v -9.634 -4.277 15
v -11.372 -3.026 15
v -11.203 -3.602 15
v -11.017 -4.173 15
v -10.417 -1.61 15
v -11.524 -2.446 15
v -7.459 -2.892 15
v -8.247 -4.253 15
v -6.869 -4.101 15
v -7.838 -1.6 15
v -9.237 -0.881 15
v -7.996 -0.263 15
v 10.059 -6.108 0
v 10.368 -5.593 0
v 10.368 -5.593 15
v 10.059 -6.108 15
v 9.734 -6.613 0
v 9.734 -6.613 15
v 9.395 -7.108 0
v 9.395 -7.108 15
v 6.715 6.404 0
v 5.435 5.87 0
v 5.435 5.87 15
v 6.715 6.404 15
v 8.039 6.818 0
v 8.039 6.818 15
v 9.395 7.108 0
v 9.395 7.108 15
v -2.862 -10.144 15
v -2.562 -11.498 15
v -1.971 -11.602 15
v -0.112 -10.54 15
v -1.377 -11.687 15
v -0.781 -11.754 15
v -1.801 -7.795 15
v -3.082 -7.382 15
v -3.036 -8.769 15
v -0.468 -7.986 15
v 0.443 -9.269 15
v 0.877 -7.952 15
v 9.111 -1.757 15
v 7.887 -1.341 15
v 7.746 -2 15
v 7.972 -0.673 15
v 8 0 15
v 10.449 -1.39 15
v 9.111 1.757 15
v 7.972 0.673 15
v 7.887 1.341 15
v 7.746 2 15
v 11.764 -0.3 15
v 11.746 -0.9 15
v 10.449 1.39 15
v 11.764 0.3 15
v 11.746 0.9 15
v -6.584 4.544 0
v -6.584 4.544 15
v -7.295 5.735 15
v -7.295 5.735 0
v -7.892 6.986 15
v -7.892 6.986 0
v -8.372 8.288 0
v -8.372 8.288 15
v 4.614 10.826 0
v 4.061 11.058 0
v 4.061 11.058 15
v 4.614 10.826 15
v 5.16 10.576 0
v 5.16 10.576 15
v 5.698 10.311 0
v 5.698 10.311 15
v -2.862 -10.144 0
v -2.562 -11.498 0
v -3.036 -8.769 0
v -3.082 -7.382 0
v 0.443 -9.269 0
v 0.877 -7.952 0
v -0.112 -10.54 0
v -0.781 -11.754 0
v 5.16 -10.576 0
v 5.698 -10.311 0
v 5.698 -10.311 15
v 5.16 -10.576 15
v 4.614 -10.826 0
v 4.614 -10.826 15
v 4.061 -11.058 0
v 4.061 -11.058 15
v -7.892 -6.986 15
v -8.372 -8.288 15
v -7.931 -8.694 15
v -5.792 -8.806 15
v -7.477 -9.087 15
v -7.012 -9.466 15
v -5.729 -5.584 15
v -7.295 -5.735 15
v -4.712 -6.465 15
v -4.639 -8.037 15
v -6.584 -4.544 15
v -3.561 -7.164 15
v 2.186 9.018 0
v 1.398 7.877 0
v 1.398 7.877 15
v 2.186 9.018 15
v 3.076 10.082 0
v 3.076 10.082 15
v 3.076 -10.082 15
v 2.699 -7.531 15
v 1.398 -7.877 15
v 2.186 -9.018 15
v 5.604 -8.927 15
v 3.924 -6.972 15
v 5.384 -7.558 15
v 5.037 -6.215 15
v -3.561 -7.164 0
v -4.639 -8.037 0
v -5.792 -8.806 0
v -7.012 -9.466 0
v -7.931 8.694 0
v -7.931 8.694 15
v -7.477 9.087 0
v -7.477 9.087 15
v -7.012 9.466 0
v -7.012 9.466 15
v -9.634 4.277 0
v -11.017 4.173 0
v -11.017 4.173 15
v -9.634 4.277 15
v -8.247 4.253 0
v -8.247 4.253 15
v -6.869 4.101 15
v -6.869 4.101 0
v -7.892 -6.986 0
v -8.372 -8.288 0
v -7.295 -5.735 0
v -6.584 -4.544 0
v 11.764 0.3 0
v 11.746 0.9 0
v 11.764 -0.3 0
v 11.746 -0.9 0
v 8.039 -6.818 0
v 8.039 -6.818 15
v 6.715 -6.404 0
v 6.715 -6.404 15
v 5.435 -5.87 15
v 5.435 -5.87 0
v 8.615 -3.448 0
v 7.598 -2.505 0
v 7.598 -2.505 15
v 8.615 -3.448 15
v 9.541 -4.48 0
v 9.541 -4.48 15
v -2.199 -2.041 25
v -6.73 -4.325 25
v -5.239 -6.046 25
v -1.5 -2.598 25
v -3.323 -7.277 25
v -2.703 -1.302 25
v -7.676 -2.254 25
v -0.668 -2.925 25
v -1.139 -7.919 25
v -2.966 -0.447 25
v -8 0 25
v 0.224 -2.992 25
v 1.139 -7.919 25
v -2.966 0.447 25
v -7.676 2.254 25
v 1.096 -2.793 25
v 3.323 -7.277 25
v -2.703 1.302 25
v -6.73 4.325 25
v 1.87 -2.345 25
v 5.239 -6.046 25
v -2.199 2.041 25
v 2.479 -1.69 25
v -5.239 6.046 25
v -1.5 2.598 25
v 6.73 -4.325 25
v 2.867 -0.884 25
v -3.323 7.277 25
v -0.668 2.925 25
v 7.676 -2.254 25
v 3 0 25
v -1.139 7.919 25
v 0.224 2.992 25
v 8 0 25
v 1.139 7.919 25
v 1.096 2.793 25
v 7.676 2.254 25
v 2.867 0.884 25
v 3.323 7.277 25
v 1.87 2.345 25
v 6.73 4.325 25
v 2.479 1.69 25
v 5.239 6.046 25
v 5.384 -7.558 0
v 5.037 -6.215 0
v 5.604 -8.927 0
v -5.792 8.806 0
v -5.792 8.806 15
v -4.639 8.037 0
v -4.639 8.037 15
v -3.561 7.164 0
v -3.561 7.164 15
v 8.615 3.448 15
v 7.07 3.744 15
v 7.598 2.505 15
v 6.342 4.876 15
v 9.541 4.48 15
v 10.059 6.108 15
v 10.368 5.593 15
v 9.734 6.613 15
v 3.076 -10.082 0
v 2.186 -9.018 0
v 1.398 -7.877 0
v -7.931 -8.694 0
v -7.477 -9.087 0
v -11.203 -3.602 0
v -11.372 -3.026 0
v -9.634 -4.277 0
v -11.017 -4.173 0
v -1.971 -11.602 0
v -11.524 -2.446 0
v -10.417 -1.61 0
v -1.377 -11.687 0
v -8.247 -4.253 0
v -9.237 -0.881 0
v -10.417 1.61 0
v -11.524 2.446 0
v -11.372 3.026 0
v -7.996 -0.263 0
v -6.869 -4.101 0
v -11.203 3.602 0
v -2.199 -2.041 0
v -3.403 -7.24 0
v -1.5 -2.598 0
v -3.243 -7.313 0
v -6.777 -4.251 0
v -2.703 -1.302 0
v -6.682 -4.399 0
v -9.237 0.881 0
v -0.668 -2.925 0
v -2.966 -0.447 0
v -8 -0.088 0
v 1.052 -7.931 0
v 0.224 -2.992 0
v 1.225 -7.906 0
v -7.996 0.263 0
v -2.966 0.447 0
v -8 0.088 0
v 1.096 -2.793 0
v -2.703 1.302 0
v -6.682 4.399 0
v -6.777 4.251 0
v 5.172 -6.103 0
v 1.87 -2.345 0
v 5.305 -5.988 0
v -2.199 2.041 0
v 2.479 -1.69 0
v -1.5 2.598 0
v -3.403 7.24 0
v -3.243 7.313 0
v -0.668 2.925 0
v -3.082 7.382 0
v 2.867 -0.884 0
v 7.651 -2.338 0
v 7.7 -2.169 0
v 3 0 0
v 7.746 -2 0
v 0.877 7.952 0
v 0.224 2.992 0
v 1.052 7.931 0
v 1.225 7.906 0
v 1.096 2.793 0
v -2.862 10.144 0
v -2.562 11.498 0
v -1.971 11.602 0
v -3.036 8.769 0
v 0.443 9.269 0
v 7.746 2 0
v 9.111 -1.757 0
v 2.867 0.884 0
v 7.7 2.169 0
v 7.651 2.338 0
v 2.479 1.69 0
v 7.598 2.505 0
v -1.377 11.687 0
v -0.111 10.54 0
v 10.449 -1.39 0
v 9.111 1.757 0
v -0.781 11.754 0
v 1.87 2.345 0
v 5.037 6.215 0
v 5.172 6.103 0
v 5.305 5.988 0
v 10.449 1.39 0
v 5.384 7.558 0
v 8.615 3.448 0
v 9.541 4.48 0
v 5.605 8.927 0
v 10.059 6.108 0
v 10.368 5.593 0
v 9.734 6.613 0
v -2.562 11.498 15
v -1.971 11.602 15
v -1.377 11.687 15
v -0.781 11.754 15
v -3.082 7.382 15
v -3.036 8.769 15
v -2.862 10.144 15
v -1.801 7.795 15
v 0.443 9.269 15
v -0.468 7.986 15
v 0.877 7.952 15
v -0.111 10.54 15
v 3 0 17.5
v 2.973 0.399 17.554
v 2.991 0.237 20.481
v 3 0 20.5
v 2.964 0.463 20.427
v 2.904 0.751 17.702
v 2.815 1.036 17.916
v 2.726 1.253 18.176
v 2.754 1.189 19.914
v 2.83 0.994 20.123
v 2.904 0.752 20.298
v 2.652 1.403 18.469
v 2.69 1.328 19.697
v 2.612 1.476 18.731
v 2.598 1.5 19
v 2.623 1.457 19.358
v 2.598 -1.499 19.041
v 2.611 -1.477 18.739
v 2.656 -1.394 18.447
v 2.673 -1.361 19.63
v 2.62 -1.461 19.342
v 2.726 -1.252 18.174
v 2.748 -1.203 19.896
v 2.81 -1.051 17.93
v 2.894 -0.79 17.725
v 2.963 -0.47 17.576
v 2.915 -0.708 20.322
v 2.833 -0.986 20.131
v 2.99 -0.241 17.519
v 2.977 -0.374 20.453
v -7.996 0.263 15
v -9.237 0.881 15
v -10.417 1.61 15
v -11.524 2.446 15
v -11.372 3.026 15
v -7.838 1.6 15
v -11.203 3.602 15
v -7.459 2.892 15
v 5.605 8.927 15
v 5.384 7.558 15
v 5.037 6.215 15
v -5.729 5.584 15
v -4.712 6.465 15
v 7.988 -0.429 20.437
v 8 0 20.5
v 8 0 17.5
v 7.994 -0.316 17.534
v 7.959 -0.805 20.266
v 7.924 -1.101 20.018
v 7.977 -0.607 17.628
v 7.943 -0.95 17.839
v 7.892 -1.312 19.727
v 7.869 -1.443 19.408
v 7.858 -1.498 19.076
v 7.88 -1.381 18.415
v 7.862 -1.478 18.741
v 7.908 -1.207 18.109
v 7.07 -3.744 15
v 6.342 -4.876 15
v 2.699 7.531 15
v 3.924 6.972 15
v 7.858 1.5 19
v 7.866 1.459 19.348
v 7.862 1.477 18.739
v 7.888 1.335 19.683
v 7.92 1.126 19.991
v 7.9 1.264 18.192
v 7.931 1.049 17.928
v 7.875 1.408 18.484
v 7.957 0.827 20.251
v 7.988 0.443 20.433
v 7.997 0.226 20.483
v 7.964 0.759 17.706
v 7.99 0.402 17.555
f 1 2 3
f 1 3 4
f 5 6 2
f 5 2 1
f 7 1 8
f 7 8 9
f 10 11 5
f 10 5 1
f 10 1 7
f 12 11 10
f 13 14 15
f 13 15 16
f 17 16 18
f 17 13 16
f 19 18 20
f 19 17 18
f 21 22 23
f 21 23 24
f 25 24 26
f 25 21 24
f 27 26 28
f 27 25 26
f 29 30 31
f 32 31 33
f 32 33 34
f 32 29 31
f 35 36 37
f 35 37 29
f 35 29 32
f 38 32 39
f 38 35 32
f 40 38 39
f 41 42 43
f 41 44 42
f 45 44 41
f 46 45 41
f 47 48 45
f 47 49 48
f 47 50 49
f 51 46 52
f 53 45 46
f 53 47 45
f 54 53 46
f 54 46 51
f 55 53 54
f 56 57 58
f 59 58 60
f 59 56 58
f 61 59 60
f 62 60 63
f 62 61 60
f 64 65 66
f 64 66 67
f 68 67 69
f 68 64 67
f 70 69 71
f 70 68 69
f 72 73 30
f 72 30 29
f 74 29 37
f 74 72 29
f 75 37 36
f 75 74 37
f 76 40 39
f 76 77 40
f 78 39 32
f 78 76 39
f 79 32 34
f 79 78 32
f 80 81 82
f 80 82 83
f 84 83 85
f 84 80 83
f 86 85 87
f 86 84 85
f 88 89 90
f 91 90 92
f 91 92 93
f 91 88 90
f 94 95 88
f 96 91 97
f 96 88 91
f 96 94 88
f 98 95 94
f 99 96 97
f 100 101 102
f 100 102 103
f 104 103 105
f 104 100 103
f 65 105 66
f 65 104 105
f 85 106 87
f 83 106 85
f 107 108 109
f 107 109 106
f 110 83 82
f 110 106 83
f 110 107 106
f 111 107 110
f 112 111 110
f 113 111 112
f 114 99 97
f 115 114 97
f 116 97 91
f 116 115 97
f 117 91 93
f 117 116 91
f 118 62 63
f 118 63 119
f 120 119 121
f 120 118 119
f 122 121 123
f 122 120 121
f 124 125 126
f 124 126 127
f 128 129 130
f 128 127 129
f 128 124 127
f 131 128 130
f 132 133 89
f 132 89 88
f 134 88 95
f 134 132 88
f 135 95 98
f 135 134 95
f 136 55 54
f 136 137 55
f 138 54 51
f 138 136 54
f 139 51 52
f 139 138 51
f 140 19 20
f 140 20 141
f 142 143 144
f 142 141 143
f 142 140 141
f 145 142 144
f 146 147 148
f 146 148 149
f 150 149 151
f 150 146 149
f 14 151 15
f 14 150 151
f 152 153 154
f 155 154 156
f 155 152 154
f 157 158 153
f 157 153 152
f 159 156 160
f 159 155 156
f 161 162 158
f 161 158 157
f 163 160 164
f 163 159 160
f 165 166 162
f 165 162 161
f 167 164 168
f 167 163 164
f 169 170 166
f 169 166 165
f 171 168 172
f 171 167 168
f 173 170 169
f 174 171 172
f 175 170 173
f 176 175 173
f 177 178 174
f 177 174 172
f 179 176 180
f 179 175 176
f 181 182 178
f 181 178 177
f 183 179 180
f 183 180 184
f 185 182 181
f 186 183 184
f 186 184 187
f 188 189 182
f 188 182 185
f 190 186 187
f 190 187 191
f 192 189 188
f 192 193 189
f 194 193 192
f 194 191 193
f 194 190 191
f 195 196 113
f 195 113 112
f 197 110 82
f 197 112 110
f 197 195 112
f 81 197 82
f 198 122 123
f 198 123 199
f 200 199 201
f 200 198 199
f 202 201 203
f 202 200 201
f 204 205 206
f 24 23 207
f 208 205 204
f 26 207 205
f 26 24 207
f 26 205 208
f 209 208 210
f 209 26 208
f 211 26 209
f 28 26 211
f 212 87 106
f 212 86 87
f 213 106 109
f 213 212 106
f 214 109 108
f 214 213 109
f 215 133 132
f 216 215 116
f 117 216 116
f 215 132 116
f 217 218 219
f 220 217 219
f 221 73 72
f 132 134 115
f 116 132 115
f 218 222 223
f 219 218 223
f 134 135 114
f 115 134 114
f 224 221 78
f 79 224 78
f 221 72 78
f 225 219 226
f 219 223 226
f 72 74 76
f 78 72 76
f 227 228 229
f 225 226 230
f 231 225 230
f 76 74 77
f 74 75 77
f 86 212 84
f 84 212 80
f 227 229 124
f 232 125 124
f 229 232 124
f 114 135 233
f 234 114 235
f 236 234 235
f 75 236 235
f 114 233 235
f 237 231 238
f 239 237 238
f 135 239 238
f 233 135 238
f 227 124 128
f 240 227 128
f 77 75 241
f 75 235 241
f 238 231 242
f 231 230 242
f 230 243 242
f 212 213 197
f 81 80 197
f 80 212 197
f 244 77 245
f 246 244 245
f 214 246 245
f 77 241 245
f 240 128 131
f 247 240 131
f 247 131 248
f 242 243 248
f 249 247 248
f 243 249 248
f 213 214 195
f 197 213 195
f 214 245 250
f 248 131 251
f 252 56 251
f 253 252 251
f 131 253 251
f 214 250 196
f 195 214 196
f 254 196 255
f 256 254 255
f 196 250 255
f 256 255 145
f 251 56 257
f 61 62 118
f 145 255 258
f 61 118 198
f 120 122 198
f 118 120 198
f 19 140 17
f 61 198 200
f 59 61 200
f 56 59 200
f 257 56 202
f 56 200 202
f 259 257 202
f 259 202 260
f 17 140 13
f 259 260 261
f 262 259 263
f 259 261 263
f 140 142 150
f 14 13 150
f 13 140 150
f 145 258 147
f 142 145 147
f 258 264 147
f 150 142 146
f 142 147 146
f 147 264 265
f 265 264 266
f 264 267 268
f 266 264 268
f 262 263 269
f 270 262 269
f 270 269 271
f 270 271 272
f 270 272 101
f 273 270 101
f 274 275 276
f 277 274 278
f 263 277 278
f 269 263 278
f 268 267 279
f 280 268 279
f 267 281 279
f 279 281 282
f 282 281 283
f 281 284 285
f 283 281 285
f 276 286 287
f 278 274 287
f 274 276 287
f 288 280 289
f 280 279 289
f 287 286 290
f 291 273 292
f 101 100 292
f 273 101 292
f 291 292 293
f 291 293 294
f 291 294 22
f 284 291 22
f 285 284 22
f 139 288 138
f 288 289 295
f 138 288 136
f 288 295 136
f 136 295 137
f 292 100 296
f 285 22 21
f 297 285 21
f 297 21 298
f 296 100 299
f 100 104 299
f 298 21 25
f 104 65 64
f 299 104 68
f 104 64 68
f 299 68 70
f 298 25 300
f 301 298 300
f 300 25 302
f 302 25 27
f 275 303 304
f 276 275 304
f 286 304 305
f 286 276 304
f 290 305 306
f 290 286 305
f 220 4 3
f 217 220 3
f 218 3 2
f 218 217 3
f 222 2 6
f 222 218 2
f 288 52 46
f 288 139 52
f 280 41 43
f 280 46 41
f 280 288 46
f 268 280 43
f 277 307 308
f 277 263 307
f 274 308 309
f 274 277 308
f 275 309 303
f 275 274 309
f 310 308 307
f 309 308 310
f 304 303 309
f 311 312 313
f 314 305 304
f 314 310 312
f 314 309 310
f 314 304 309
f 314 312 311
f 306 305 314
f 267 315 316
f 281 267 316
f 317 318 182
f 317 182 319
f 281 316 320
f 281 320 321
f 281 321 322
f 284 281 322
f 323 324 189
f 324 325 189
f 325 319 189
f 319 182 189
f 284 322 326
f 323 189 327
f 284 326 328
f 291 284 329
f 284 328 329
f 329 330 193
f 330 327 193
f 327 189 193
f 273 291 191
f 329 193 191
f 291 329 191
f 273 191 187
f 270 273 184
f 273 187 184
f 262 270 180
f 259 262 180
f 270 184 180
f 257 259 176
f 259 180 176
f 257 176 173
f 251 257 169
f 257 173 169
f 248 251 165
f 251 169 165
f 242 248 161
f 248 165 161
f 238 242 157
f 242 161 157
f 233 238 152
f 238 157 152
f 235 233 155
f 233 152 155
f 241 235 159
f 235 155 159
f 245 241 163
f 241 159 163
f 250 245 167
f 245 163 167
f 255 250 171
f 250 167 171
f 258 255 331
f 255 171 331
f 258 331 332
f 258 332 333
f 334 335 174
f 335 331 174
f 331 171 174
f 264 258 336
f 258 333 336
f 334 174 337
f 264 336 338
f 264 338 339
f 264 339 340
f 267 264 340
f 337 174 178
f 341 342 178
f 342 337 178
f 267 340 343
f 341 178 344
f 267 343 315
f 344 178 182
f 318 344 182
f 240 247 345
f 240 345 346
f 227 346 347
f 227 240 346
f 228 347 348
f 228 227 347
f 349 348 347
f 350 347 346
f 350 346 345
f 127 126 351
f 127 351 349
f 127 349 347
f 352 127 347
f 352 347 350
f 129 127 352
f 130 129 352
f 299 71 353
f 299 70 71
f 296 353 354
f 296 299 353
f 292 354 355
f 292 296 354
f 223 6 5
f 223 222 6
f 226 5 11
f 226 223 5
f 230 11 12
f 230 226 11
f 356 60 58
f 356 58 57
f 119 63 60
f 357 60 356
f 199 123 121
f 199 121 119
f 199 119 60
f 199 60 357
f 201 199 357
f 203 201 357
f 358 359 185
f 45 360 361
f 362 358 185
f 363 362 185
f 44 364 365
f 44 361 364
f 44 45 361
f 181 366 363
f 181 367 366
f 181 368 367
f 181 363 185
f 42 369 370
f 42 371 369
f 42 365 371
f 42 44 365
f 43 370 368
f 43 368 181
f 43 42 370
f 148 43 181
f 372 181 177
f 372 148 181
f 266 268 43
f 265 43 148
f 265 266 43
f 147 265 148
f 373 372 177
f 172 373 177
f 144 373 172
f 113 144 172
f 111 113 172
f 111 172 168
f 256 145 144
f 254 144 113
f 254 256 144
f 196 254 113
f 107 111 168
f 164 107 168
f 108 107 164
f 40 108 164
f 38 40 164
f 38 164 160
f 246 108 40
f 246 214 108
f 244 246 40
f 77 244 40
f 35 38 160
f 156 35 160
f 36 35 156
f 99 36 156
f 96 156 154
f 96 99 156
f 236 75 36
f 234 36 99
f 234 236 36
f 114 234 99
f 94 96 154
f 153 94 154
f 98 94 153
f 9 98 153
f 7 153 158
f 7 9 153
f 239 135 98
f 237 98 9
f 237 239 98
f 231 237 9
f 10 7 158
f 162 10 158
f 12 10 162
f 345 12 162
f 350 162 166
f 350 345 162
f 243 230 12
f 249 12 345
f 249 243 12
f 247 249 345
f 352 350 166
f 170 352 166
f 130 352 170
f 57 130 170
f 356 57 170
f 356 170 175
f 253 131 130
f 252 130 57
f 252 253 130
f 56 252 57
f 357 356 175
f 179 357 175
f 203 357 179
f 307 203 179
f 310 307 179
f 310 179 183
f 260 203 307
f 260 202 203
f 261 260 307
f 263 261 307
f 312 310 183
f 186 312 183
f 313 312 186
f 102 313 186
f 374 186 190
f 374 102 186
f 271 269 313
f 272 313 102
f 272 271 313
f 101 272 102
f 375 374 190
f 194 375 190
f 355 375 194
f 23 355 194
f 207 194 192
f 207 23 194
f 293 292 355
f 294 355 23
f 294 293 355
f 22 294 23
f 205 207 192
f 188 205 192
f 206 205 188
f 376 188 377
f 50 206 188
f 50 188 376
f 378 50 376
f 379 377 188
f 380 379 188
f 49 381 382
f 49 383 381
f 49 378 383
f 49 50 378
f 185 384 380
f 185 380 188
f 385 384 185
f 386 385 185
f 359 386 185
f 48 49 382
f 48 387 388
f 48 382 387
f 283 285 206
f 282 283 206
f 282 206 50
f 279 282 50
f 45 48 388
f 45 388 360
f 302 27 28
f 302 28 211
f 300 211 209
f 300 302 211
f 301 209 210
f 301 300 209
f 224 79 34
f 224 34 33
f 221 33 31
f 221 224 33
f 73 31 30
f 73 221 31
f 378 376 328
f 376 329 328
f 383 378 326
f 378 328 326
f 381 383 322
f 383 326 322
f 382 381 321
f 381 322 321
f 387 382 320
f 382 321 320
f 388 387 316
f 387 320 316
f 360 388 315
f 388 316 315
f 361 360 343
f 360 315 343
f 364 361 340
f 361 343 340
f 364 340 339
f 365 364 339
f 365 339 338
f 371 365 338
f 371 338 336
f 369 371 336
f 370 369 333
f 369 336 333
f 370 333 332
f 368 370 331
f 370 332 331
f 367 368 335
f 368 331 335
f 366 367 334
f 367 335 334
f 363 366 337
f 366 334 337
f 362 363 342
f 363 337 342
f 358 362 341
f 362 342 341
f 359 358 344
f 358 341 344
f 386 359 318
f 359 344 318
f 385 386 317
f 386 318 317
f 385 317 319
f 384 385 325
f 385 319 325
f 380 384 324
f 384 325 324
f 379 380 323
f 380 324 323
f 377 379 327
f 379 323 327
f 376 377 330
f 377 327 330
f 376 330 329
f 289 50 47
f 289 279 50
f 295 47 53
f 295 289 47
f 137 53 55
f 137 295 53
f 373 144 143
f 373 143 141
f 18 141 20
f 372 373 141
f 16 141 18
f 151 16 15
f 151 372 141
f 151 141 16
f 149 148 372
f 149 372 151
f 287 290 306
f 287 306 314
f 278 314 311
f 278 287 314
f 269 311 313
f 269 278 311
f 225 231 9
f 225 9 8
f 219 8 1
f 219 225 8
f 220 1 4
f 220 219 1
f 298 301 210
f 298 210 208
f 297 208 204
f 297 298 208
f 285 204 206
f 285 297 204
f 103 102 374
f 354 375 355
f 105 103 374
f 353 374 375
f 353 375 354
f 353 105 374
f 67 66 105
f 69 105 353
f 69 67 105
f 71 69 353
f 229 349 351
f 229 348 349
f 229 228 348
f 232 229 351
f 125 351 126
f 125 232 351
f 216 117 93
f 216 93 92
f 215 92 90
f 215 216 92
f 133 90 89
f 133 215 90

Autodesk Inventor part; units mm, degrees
ref_plane "YZ Plane" through (0, 0, 0) normal (1, 0, 0) x (0, 1, 0)
ref_plane "XZ Plane" through (0, 0, 0) normal (0, 1, 0) x (-1, 0, 0)
ref_plane "XY Plane" through (0, 0, 0) normal (0, 0, 1) x (1, 0, 0)
sketch "Sketch1" plane through (0, 0, 0) normal (0, 0, 1) x (1, 0, 0)
  circle A0 centre (0, 0) radius 8
  line L0 (0, 0) -> (16, 0) construction
  arc A1 (11.746, 0.9) -> (7.746, 2) centre (5.8068, -12.8741) ccw
  arc A2 (7.746, -2) -> (11.746, -0.9) centre (5.8068, 12.8741) ccw
  arc A3 (7.746, -2) -> (7.746, 2) centre (0, 0) ccw
  arc A4 (11.746, -0.9) -> (11.746, 0.9) centre (-8.2338, 0) ccw
  arc A5 (9.3948, 7.1075) -> (5.435, 5.8703) centre (11.8453, -7.691) ccw
  arc A6 (10.3679, 5.5932) -> (9.3948, 7.1075) centre (-6.9267, -4.4515) ccw
  arc A7 (7.5976, 2.5053) -> (10.3679, 5.5932) centre (-2.0753, 13.9698) ccw
  arc A8 (7.5976, 2.5053) -> (5.435, 5.8703) centre (0, 0) ccw
  arc A9 (4.0608, 11.0584) -> (1.3985, 7.8768) centre (14.123, -0.066) ccw
  arc A10 (5.6981, 10.3106) -> (4.0608, 11.0584) centre (-3.4204, -7.4897) ccw
  arc A11 (5.0371, 6.2151) -> (5.6981, 10.3106) centre (-9.2985, 10.6302) ccw
  arc A12 (5.0371, 6.2151) -> (1.3985, 7.8768) centre (0, 0) ccw
  arc A13 (-2.5625, 11.4983) -> (-3.082, 7.3825) centre (11.9167, 7.5799) ccw
  arc A14 (-0.7808, 11.7545) -> (-2.5625, 11.4983) centre (1.1718, -8.15) ccw
  arc A15 (0.8773, 7.9518) -> (-0.7808, 11.7545) centre (-13.5695, 3.9155) ccw
  arc A16 (0.8773, 7.9518) -> (-3.082, 7.3825) centre (0, 0) ccw
  arc A17 (-8.3721, 8.2876) -> (-6.584, 4.5443) centre (5.927, 12.8193) ccw
  arc A18 (-7.0118, 9.4664) -> (-8.3721, 8.2876) centre (5.392, -6.2227) ccw
  arc A19 (-3.561, 7.1637) -> (-7.0118, 9.4664) centre (-13.5323, -4.0423) ccw
  arc A20 (-3.561, 7.1637) -> (-6.584, 4.5443) centre (0, 0) ccw
  arc A21 (-11.5237, 2.4457) -> (-7.9957, 0.2633) centre (-1.9446, 13.9886) ccw
  arc A22 (-11.0166, 4.1728) -> (-11.5237, 2.4457) centre (7.9002, -2.3197) ccw
  arc A23 (-6.8687, 4.1013) -> (-11.0166, 4.1728) centre (-9.1987, -10.7167) ccw
  arc A24 (-6.8687, 4.1013) -> (-7.9957, 0.2633) centre (0, 0) ccw
  arc A25 (-11.0166, -4.1728) -> (-6.8687, -4.1013) centre (-9.1987, 10.7167) ccw
  arc A26 (-11.5237, -2.4457) -> (-11.0166, -4.1728) centre (7.9002, 2.3197) ccw
  arc A27 (-7.9957, -0.2633) -> (-11.5237, -2.4457) centre (-1.9446, -13.9886) ccw
  arc A28 (-7.9957, -0.2633) -> (-6.8687, -4.1013) centre (0, 0) ccw
  arc A29 (-7.0118, -9.4664) -> (-3.561, -7.1637) centre (-13.5323, 4.0423) ccw
  arc A30 (-8.3721, -8.2876) -> (-7.0118, -9.4664) centre (5.392, 6.2227) ccw
  arc A31 (-6.584, -4.5443) -> (-8.3721, -8.2876) centre (5.927, -12.8193) ccw
  arc A32 (-6.584, -4.5443) -> (-3.561, -7.1637) centre (0, 0) ccw
  arc A33 (-0.7808, -11.7545) -> (0.8773, -7.9518) centre (-13.5695, -3.9155) ccw
  arc A34 (-2.5625, -11.4983) -> (-0.7808, -11.7545) centre (1.1718, 8.15) ccw
  arc A35 (-3.082, -7.3825) -> (-2.5625, -11.4983) centre (11.9167, -7.5799) ccw
  arc A36 (-3.082, -7.3825) -> (0.8773, -7.9518) centre (0, 0) ccw
  arc A37 (5.6981, -10.3106) -> (5.0371, -6.2151) centre (-9.2985, -10.6302) ccw
  arc A38 (4.0608, -11.0584) -> (5.6981, -10.3106) centre (-3.4204, 7.4897) ccw
  arc A39 (1.3985, -7.8768) -> (4.0608, -11.0584) centre (14.123, 0.066) ccw
  arc A40 (1.3985, -7.8768) -> (5.0371, -6.2151) centre (0, 0) ccw
  arc A41 (10.3679, -5.5932) -> (7.5976, -2.5053) centre (-2.0753, -13.9698) ccw
  arc A42 (9.3948, -7.1075) -> (10.3679, -5.5932) centre (-6.9267, 4.4515) ccw
  arc A43 (5.435, -5.8703) -> (9.3948, -7.1075) centre (11.8453, 7.691) ccw
  arc A44 (5.435, -5.8703) -> (7.5976, -2.5053) centre (0, 0) ccw
  point P0 (11.7662, 0)
  point P1 (9.8984, 6.3613)
  point P2 (4.8879, 10.7029)
  point P3 (-1.6745, 11.6465)
  point P4 (-7.7052, 8.8923)
  point P5 (-11.2896, 3.3149)
  point P6 (-11.2896, -3.3149)
  point P7 (-7.7052, -8.8923)
  point P8 (-1.6745, -11.6465)
  point P9 (4.8879, -10.7029)
  point P10 (9.8984, -6.3613)
  dimension "d0" = 16
  dimension "d1" = 16
  dimension "d2" = 15
  dimension "d3" = 4
  dimension "d4" = 2
  dimension "d6" = 1.8
  dimension "d15" = 20
  dimension "d18" = 360
extrude "Extrusion1" add sketch "Sketch1" along normal blind 15
sketch "Sketch2" plane through (0, 0, 15) normal (0, 0, 1) x (1, 0, 0)
  circle A0 centre (0, 0) radius 3
  circle A1 centre (0, 0) radius 8
  dimension "d22" = 6
  dimension "d23" = 16
extrude "Extrusion2" add sketch "Sketch2" along normal blind 10
sketch "Sketch3" plane through (0, 0, 25) normal (0, 0, 1) x (1, 0, 0)
  circle A0 centre (0, 0) radius 3 projected
extrude "Extrusion3" cut sketch "Sketch3" against normal through all
sketch "Sketch4" plane through (0, 0, 0) normal (1, 0, 0) x (0, 1, 0)
  circle A0 centre (0, 19) radius 1.5
  line L0 (8, 25) -> (-8, 25) projected
  point P0 (0, 0)
  dimension "d28" = 3
  dimension "d29" = 6
extrude "Extrusion4" cut sketch "Sketch4" along normal through all
properties part number "Motor Gear" material "ABS Plastic"
